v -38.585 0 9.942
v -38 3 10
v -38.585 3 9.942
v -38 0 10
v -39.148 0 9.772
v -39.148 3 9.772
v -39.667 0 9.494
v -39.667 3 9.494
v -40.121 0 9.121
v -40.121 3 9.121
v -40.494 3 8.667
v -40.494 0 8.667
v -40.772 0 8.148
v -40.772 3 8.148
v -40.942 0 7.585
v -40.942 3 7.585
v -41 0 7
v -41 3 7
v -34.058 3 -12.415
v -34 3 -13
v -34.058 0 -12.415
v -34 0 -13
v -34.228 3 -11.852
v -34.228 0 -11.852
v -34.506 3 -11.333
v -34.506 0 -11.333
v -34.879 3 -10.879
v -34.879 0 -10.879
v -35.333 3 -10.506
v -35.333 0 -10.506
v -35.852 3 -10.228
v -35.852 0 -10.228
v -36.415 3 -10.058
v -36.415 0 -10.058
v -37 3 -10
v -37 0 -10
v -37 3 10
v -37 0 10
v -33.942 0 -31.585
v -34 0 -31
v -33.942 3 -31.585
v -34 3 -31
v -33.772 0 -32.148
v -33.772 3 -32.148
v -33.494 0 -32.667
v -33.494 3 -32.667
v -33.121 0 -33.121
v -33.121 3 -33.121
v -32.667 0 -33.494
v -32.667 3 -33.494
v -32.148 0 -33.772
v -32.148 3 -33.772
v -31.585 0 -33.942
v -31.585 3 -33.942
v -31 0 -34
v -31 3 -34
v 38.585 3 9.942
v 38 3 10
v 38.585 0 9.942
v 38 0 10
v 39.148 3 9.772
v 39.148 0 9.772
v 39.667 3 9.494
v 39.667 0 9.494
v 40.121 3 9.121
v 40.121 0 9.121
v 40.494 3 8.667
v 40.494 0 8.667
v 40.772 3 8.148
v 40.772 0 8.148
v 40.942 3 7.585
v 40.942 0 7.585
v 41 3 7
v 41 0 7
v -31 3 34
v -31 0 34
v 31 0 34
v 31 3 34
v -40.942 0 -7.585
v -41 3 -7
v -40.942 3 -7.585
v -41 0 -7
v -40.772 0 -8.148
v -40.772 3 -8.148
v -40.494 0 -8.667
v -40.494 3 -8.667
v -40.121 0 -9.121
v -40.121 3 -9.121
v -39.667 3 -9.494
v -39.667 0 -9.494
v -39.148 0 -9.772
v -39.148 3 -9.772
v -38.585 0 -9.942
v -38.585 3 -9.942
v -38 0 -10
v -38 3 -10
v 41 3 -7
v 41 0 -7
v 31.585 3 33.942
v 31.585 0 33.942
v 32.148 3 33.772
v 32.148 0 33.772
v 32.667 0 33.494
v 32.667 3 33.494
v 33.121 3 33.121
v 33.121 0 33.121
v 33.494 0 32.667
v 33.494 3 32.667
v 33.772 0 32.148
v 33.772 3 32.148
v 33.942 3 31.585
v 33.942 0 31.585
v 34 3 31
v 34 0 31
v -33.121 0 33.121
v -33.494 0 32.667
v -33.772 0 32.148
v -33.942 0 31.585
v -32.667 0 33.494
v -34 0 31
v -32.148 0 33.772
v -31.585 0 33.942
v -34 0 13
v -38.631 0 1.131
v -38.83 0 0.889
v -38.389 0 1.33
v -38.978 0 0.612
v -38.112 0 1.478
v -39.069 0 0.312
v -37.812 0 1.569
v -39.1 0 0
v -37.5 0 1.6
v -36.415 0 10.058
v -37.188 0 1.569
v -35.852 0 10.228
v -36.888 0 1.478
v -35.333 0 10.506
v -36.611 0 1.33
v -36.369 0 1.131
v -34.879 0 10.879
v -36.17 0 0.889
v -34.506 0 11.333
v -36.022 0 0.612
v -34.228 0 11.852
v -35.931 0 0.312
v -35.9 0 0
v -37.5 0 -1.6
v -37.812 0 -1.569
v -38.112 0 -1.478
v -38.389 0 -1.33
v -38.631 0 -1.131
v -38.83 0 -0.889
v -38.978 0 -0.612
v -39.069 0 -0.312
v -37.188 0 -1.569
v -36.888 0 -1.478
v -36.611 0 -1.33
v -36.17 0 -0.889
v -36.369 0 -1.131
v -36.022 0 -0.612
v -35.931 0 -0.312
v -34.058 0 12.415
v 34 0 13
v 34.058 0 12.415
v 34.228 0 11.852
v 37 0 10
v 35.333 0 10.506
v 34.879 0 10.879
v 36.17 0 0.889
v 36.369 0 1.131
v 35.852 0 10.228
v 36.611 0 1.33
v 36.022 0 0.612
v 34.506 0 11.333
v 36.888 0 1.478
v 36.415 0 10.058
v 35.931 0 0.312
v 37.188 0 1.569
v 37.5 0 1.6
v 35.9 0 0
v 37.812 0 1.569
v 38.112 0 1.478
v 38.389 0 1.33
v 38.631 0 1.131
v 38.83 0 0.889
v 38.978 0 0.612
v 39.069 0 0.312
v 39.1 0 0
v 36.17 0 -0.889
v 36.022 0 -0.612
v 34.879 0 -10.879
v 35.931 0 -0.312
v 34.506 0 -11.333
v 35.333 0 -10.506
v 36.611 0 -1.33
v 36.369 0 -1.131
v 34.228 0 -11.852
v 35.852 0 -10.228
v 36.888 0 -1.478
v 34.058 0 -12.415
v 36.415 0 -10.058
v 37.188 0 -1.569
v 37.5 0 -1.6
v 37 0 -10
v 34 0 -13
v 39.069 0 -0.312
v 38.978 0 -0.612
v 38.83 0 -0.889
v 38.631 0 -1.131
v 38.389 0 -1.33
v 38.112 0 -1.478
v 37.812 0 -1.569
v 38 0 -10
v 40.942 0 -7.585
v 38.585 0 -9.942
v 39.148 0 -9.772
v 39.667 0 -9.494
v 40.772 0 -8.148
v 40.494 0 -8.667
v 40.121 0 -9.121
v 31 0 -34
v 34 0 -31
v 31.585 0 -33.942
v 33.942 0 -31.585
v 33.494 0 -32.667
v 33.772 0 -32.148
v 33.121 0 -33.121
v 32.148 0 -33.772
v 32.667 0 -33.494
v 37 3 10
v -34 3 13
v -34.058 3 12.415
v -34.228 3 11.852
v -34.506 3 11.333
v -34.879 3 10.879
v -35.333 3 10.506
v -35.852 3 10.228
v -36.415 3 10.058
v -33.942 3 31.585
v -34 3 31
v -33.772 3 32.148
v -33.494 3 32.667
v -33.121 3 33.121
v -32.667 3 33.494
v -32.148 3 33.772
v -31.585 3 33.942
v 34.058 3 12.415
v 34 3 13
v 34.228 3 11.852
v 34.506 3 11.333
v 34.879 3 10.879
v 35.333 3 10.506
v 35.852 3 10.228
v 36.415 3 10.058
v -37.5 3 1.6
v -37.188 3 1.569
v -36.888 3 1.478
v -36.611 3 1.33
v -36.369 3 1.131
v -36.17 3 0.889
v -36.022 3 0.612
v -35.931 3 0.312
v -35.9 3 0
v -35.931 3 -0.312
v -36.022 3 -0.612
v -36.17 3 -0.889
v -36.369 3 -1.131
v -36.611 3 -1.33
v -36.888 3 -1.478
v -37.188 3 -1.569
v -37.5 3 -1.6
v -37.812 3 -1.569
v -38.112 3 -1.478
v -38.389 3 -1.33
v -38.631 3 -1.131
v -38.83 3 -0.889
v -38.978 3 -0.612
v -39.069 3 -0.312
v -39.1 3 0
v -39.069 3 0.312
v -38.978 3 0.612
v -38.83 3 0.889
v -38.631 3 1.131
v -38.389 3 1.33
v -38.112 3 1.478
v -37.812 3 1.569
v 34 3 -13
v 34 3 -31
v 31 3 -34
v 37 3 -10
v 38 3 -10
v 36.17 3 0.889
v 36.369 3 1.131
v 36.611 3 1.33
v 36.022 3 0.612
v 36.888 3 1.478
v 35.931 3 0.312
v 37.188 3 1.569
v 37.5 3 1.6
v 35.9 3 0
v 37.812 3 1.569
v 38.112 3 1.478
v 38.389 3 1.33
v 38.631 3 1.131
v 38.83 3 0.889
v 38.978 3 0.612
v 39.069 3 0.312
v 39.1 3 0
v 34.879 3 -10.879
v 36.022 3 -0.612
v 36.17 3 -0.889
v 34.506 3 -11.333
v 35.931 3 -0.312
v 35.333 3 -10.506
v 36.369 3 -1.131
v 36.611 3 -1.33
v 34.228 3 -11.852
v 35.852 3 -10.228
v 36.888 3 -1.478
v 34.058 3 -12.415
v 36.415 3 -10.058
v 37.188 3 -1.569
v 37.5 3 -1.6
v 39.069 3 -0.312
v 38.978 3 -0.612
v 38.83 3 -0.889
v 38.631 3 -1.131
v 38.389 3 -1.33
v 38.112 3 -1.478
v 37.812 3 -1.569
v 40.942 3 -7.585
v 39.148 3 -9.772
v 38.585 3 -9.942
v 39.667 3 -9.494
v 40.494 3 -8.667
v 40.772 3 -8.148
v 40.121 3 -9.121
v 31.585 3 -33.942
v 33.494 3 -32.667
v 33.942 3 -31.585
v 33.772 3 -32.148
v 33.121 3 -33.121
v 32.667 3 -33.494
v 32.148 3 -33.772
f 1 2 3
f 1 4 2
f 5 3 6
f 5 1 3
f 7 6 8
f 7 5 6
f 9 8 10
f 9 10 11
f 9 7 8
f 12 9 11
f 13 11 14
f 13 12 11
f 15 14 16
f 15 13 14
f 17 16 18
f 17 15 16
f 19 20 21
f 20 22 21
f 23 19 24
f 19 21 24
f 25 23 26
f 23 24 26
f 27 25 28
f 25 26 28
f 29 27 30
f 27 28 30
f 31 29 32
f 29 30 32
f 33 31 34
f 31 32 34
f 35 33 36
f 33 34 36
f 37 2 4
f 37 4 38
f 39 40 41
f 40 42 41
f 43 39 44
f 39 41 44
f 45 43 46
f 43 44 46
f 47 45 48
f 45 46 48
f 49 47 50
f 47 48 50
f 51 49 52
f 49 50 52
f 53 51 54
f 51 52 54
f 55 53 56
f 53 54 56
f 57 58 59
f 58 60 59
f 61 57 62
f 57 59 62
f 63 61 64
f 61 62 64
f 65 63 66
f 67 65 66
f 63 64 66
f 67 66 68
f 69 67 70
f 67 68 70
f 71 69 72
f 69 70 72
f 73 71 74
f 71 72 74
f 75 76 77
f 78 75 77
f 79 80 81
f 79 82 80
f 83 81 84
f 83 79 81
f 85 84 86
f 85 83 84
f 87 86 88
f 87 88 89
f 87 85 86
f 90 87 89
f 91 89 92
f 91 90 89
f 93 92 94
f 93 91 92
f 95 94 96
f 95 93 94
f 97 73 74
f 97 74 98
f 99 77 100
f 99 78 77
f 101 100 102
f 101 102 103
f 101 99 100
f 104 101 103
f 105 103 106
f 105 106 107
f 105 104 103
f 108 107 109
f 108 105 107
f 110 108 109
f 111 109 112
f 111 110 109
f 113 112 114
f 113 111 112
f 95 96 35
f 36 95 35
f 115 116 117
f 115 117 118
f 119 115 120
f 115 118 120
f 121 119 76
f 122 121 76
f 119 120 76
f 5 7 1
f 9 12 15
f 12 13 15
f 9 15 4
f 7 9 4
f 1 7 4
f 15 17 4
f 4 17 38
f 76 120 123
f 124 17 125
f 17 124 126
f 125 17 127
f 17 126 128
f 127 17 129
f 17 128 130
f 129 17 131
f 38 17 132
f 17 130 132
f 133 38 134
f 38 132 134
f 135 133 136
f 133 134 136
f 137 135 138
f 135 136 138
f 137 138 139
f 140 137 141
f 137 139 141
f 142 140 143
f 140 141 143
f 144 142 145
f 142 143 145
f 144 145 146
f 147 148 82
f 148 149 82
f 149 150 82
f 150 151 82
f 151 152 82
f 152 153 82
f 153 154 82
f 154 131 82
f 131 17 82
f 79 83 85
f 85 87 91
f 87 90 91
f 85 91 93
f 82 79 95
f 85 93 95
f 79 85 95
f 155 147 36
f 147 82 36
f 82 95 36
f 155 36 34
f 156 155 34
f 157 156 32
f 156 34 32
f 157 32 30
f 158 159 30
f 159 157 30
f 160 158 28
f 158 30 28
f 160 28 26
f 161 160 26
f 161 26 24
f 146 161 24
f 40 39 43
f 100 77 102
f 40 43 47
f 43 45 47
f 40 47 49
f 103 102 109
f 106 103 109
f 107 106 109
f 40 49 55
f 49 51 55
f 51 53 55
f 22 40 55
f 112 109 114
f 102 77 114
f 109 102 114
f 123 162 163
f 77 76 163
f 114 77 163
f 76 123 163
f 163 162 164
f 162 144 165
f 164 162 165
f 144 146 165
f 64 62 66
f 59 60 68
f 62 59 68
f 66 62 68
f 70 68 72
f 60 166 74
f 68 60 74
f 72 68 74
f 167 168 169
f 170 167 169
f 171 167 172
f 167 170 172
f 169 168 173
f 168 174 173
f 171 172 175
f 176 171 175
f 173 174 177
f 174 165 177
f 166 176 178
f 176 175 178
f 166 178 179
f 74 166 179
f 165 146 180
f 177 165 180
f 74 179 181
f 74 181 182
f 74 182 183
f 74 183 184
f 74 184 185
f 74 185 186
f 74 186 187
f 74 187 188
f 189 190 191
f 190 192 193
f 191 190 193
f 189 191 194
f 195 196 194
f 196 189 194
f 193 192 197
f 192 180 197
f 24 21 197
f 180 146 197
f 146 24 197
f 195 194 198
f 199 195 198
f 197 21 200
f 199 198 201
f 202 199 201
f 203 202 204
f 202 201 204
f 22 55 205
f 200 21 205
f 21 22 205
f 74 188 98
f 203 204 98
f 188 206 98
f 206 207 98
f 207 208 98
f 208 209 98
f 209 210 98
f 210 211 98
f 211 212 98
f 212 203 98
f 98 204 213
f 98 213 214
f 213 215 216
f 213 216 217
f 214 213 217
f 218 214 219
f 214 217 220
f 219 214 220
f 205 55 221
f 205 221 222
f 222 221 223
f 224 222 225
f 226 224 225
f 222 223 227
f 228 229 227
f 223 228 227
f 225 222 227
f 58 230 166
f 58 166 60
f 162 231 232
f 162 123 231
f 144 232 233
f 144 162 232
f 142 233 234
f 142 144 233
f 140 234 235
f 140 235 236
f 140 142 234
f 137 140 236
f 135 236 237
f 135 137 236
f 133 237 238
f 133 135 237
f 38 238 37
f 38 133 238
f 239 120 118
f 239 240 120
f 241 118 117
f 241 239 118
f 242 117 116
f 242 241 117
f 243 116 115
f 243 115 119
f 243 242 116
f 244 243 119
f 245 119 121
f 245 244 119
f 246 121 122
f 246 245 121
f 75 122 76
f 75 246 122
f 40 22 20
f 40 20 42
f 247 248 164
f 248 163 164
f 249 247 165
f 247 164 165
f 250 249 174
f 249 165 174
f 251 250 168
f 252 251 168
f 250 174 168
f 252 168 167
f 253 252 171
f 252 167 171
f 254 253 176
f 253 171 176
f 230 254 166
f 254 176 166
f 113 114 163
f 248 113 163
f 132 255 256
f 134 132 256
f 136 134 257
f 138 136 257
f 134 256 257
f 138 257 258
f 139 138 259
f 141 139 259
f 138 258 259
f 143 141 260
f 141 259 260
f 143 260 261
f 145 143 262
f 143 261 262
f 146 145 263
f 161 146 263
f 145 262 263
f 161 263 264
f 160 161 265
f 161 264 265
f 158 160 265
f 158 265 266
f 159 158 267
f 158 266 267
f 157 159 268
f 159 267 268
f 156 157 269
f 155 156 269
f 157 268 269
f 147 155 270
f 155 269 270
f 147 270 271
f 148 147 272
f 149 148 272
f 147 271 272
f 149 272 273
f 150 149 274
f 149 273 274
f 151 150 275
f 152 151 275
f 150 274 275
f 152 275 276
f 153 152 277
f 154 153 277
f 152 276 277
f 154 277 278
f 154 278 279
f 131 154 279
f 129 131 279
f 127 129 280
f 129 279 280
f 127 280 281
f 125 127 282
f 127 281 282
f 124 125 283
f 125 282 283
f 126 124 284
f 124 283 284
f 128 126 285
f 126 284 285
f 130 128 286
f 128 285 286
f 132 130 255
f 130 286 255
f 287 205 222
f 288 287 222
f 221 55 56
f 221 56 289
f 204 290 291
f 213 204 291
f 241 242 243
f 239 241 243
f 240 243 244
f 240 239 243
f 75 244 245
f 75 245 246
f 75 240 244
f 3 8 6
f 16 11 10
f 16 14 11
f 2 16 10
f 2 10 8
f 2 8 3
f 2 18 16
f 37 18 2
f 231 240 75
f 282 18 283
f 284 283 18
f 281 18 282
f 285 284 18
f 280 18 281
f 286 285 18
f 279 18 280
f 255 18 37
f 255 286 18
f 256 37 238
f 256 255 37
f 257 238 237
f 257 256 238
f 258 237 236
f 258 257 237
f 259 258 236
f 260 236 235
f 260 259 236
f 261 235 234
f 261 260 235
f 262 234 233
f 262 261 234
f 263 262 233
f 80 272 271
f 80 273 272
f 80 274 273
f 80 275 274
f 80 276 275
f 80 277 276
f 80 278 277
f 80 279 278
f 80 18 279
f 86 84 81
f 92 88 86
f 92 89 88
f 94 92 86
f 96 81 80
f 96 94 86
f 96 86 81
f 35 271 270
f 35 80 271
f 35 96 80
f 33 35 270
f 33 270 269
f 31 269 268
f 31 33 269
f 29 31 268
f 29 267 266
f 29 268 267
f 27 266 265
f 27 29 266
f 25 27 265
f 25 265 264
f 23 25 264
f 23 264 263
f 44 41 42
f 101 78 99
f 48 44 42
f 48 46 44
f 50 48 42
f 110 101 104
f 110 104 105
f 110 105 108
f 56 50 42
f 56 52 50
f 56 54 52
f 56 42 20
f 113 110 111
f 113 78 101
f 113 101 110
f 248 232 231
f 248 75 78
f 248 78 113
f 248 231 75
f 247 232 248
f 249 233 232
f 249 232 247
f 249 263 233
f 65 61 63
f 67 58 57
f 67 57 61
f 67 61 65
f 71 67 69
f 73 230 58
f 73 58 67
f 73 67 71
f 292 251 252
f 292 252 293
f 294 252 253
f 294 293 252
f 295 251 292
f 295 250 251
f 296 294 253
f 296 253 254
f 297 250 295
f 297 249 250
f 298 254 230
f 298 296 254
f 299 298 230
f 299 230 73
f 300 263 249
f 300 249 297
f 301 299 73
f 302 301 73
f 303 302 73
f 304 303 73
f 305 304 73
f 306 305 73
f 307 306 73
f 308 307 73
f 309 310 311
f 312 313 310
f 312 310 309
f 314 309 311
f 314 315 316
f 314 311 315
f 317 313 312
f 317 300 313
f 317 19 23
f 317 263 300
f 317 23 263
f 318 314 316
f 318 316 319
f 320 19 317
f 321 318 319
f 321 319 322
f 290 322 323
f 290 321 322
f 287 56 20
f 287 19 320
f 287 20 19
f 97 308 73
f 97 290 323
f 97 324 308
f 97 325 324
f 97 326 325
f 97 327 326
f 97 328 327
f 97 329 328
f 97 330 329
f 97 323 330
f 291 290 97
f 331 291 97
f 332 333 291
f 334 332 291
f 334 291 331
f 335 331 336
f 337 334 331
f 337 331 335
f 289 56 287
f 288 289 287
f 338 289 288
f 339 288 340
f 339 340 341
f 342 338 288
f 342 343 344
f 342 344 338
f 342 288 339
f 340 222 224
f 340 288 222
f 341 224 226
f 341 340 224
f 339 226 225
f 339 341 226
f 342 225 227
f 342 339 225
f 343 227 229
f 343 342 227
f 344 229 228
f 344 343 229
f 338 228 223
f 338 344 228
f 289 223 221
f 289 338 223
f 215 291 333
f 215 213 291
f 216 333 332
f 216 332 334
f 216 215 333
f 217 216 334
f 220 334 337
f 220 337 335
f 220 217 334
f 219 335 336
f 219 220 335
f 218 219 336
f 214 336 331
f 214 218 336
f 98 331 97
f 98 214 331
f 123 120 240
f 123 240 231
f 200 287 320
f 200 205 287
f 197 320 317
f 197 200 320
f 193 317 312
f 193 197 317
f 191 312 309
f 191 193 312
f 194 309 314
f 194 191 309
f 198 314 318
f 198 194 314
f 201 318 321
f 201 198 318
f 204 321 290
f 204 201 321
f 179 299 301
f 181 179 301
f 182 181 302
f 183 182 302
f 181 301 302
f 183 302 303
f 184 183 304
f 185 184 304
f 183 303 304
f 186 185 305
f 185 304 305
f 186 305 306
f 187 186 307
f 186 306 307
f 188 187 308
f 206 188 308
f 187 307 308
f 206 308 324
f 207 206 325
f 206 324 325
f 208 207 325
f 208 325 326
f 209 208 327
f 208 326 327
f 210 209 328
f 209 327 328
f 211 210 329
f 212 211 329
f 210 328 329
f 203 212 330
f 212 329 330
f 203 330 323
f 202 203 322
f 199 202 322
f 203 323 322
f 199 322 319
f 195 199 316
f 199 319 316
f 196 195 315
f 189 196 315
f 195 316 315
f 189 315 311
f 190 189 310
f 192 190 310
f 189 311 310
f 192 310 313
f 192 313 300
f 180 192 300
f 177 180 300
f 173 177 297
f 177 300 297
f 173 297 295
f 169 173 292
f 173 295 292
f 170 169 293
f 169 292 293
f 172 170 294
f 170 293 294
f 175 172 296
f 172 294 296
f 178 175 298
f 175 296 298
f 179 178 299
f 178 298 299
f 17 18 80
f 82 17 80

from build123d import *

# Parameters (mm, degrees)
SKETCH1_W           = 68
SKETCH1_H           = 68
BOSS_EXTRUDE1_DEPTH = 3
SKETCH2_W           = 7
SKETCH2_H           = 20
SKETCH2_R           = 1.6
BOSS_EXTRUDE2_DEPTH = 3
FILLET1_R           = 3


with BuildPart() as part:
    # Sketch1 → Boss-Extrude1 (new body)
    with BuildSketch(Plane(origin=(0, 0, 0), x_dir=(1, 0, 0), z_dir=(0, 1, 0))):
        Rectangle(SKETCH1_W, SKETCH1_H)
    extrude(amount=BOSS_EXTRUDE1_DEPTH)

    # Sketch2 → Boss-Extrude2 (add)
    # profile 1 of 2: a face of its own
    with BuildSketch(Plane(origin=(0, 3, 0), x_dir=(1, 0, 0), z_dir=(0, 1, 0))):
        with Locations((37.5, 0)):
            Rectangle(SKETCH2_W, SKETCH2_H)
        with Locations(Location((37.5, 0, 0), (0, 0, 270))):
            Circle(SKETCH2_R, mode=Mode.SUBTRACT)
    # profile 2 of 2: a face of its own
    with BuildSketch(Plane(origin=(0, 3, 0), x_dir=(1, 0, 0), z_dir=(0, 1, 0))):
        with Locations((-37.5, 0)):
            Rectangle(SKETCH2_W, SKETCH2_H)
        with Locations(Location((-37.5, 0, 0), (0, 0, 270))):
            Circle(SKETCH2_R, mode=Mode.SUBTRACT)
    extrude(amount=-BOSS_EXTRUDE2_DEPTH)

    # Fillet1
    fillet1_edges = [part.edges().sort_by_distance(p)[0] for p in [
        (34, 1.5, 10),
        (41, 1.5, 10),
        (41, 1.5, -10),
        (34, 1.5, -10),
        (-41, 1.5, -10),
        (-41, 1.5, 10),
        (-34, 1.5, 10),
        (-34, 1.5, -10),
        (-34, 1.5, 34),
        (34, 1.5, 34),
        (34, 1.5, -34),
        (-34, 1.5, -34),
    ]]
    fillet(fillet1_edges, radius=FILLET1_R)


solid = part.part
